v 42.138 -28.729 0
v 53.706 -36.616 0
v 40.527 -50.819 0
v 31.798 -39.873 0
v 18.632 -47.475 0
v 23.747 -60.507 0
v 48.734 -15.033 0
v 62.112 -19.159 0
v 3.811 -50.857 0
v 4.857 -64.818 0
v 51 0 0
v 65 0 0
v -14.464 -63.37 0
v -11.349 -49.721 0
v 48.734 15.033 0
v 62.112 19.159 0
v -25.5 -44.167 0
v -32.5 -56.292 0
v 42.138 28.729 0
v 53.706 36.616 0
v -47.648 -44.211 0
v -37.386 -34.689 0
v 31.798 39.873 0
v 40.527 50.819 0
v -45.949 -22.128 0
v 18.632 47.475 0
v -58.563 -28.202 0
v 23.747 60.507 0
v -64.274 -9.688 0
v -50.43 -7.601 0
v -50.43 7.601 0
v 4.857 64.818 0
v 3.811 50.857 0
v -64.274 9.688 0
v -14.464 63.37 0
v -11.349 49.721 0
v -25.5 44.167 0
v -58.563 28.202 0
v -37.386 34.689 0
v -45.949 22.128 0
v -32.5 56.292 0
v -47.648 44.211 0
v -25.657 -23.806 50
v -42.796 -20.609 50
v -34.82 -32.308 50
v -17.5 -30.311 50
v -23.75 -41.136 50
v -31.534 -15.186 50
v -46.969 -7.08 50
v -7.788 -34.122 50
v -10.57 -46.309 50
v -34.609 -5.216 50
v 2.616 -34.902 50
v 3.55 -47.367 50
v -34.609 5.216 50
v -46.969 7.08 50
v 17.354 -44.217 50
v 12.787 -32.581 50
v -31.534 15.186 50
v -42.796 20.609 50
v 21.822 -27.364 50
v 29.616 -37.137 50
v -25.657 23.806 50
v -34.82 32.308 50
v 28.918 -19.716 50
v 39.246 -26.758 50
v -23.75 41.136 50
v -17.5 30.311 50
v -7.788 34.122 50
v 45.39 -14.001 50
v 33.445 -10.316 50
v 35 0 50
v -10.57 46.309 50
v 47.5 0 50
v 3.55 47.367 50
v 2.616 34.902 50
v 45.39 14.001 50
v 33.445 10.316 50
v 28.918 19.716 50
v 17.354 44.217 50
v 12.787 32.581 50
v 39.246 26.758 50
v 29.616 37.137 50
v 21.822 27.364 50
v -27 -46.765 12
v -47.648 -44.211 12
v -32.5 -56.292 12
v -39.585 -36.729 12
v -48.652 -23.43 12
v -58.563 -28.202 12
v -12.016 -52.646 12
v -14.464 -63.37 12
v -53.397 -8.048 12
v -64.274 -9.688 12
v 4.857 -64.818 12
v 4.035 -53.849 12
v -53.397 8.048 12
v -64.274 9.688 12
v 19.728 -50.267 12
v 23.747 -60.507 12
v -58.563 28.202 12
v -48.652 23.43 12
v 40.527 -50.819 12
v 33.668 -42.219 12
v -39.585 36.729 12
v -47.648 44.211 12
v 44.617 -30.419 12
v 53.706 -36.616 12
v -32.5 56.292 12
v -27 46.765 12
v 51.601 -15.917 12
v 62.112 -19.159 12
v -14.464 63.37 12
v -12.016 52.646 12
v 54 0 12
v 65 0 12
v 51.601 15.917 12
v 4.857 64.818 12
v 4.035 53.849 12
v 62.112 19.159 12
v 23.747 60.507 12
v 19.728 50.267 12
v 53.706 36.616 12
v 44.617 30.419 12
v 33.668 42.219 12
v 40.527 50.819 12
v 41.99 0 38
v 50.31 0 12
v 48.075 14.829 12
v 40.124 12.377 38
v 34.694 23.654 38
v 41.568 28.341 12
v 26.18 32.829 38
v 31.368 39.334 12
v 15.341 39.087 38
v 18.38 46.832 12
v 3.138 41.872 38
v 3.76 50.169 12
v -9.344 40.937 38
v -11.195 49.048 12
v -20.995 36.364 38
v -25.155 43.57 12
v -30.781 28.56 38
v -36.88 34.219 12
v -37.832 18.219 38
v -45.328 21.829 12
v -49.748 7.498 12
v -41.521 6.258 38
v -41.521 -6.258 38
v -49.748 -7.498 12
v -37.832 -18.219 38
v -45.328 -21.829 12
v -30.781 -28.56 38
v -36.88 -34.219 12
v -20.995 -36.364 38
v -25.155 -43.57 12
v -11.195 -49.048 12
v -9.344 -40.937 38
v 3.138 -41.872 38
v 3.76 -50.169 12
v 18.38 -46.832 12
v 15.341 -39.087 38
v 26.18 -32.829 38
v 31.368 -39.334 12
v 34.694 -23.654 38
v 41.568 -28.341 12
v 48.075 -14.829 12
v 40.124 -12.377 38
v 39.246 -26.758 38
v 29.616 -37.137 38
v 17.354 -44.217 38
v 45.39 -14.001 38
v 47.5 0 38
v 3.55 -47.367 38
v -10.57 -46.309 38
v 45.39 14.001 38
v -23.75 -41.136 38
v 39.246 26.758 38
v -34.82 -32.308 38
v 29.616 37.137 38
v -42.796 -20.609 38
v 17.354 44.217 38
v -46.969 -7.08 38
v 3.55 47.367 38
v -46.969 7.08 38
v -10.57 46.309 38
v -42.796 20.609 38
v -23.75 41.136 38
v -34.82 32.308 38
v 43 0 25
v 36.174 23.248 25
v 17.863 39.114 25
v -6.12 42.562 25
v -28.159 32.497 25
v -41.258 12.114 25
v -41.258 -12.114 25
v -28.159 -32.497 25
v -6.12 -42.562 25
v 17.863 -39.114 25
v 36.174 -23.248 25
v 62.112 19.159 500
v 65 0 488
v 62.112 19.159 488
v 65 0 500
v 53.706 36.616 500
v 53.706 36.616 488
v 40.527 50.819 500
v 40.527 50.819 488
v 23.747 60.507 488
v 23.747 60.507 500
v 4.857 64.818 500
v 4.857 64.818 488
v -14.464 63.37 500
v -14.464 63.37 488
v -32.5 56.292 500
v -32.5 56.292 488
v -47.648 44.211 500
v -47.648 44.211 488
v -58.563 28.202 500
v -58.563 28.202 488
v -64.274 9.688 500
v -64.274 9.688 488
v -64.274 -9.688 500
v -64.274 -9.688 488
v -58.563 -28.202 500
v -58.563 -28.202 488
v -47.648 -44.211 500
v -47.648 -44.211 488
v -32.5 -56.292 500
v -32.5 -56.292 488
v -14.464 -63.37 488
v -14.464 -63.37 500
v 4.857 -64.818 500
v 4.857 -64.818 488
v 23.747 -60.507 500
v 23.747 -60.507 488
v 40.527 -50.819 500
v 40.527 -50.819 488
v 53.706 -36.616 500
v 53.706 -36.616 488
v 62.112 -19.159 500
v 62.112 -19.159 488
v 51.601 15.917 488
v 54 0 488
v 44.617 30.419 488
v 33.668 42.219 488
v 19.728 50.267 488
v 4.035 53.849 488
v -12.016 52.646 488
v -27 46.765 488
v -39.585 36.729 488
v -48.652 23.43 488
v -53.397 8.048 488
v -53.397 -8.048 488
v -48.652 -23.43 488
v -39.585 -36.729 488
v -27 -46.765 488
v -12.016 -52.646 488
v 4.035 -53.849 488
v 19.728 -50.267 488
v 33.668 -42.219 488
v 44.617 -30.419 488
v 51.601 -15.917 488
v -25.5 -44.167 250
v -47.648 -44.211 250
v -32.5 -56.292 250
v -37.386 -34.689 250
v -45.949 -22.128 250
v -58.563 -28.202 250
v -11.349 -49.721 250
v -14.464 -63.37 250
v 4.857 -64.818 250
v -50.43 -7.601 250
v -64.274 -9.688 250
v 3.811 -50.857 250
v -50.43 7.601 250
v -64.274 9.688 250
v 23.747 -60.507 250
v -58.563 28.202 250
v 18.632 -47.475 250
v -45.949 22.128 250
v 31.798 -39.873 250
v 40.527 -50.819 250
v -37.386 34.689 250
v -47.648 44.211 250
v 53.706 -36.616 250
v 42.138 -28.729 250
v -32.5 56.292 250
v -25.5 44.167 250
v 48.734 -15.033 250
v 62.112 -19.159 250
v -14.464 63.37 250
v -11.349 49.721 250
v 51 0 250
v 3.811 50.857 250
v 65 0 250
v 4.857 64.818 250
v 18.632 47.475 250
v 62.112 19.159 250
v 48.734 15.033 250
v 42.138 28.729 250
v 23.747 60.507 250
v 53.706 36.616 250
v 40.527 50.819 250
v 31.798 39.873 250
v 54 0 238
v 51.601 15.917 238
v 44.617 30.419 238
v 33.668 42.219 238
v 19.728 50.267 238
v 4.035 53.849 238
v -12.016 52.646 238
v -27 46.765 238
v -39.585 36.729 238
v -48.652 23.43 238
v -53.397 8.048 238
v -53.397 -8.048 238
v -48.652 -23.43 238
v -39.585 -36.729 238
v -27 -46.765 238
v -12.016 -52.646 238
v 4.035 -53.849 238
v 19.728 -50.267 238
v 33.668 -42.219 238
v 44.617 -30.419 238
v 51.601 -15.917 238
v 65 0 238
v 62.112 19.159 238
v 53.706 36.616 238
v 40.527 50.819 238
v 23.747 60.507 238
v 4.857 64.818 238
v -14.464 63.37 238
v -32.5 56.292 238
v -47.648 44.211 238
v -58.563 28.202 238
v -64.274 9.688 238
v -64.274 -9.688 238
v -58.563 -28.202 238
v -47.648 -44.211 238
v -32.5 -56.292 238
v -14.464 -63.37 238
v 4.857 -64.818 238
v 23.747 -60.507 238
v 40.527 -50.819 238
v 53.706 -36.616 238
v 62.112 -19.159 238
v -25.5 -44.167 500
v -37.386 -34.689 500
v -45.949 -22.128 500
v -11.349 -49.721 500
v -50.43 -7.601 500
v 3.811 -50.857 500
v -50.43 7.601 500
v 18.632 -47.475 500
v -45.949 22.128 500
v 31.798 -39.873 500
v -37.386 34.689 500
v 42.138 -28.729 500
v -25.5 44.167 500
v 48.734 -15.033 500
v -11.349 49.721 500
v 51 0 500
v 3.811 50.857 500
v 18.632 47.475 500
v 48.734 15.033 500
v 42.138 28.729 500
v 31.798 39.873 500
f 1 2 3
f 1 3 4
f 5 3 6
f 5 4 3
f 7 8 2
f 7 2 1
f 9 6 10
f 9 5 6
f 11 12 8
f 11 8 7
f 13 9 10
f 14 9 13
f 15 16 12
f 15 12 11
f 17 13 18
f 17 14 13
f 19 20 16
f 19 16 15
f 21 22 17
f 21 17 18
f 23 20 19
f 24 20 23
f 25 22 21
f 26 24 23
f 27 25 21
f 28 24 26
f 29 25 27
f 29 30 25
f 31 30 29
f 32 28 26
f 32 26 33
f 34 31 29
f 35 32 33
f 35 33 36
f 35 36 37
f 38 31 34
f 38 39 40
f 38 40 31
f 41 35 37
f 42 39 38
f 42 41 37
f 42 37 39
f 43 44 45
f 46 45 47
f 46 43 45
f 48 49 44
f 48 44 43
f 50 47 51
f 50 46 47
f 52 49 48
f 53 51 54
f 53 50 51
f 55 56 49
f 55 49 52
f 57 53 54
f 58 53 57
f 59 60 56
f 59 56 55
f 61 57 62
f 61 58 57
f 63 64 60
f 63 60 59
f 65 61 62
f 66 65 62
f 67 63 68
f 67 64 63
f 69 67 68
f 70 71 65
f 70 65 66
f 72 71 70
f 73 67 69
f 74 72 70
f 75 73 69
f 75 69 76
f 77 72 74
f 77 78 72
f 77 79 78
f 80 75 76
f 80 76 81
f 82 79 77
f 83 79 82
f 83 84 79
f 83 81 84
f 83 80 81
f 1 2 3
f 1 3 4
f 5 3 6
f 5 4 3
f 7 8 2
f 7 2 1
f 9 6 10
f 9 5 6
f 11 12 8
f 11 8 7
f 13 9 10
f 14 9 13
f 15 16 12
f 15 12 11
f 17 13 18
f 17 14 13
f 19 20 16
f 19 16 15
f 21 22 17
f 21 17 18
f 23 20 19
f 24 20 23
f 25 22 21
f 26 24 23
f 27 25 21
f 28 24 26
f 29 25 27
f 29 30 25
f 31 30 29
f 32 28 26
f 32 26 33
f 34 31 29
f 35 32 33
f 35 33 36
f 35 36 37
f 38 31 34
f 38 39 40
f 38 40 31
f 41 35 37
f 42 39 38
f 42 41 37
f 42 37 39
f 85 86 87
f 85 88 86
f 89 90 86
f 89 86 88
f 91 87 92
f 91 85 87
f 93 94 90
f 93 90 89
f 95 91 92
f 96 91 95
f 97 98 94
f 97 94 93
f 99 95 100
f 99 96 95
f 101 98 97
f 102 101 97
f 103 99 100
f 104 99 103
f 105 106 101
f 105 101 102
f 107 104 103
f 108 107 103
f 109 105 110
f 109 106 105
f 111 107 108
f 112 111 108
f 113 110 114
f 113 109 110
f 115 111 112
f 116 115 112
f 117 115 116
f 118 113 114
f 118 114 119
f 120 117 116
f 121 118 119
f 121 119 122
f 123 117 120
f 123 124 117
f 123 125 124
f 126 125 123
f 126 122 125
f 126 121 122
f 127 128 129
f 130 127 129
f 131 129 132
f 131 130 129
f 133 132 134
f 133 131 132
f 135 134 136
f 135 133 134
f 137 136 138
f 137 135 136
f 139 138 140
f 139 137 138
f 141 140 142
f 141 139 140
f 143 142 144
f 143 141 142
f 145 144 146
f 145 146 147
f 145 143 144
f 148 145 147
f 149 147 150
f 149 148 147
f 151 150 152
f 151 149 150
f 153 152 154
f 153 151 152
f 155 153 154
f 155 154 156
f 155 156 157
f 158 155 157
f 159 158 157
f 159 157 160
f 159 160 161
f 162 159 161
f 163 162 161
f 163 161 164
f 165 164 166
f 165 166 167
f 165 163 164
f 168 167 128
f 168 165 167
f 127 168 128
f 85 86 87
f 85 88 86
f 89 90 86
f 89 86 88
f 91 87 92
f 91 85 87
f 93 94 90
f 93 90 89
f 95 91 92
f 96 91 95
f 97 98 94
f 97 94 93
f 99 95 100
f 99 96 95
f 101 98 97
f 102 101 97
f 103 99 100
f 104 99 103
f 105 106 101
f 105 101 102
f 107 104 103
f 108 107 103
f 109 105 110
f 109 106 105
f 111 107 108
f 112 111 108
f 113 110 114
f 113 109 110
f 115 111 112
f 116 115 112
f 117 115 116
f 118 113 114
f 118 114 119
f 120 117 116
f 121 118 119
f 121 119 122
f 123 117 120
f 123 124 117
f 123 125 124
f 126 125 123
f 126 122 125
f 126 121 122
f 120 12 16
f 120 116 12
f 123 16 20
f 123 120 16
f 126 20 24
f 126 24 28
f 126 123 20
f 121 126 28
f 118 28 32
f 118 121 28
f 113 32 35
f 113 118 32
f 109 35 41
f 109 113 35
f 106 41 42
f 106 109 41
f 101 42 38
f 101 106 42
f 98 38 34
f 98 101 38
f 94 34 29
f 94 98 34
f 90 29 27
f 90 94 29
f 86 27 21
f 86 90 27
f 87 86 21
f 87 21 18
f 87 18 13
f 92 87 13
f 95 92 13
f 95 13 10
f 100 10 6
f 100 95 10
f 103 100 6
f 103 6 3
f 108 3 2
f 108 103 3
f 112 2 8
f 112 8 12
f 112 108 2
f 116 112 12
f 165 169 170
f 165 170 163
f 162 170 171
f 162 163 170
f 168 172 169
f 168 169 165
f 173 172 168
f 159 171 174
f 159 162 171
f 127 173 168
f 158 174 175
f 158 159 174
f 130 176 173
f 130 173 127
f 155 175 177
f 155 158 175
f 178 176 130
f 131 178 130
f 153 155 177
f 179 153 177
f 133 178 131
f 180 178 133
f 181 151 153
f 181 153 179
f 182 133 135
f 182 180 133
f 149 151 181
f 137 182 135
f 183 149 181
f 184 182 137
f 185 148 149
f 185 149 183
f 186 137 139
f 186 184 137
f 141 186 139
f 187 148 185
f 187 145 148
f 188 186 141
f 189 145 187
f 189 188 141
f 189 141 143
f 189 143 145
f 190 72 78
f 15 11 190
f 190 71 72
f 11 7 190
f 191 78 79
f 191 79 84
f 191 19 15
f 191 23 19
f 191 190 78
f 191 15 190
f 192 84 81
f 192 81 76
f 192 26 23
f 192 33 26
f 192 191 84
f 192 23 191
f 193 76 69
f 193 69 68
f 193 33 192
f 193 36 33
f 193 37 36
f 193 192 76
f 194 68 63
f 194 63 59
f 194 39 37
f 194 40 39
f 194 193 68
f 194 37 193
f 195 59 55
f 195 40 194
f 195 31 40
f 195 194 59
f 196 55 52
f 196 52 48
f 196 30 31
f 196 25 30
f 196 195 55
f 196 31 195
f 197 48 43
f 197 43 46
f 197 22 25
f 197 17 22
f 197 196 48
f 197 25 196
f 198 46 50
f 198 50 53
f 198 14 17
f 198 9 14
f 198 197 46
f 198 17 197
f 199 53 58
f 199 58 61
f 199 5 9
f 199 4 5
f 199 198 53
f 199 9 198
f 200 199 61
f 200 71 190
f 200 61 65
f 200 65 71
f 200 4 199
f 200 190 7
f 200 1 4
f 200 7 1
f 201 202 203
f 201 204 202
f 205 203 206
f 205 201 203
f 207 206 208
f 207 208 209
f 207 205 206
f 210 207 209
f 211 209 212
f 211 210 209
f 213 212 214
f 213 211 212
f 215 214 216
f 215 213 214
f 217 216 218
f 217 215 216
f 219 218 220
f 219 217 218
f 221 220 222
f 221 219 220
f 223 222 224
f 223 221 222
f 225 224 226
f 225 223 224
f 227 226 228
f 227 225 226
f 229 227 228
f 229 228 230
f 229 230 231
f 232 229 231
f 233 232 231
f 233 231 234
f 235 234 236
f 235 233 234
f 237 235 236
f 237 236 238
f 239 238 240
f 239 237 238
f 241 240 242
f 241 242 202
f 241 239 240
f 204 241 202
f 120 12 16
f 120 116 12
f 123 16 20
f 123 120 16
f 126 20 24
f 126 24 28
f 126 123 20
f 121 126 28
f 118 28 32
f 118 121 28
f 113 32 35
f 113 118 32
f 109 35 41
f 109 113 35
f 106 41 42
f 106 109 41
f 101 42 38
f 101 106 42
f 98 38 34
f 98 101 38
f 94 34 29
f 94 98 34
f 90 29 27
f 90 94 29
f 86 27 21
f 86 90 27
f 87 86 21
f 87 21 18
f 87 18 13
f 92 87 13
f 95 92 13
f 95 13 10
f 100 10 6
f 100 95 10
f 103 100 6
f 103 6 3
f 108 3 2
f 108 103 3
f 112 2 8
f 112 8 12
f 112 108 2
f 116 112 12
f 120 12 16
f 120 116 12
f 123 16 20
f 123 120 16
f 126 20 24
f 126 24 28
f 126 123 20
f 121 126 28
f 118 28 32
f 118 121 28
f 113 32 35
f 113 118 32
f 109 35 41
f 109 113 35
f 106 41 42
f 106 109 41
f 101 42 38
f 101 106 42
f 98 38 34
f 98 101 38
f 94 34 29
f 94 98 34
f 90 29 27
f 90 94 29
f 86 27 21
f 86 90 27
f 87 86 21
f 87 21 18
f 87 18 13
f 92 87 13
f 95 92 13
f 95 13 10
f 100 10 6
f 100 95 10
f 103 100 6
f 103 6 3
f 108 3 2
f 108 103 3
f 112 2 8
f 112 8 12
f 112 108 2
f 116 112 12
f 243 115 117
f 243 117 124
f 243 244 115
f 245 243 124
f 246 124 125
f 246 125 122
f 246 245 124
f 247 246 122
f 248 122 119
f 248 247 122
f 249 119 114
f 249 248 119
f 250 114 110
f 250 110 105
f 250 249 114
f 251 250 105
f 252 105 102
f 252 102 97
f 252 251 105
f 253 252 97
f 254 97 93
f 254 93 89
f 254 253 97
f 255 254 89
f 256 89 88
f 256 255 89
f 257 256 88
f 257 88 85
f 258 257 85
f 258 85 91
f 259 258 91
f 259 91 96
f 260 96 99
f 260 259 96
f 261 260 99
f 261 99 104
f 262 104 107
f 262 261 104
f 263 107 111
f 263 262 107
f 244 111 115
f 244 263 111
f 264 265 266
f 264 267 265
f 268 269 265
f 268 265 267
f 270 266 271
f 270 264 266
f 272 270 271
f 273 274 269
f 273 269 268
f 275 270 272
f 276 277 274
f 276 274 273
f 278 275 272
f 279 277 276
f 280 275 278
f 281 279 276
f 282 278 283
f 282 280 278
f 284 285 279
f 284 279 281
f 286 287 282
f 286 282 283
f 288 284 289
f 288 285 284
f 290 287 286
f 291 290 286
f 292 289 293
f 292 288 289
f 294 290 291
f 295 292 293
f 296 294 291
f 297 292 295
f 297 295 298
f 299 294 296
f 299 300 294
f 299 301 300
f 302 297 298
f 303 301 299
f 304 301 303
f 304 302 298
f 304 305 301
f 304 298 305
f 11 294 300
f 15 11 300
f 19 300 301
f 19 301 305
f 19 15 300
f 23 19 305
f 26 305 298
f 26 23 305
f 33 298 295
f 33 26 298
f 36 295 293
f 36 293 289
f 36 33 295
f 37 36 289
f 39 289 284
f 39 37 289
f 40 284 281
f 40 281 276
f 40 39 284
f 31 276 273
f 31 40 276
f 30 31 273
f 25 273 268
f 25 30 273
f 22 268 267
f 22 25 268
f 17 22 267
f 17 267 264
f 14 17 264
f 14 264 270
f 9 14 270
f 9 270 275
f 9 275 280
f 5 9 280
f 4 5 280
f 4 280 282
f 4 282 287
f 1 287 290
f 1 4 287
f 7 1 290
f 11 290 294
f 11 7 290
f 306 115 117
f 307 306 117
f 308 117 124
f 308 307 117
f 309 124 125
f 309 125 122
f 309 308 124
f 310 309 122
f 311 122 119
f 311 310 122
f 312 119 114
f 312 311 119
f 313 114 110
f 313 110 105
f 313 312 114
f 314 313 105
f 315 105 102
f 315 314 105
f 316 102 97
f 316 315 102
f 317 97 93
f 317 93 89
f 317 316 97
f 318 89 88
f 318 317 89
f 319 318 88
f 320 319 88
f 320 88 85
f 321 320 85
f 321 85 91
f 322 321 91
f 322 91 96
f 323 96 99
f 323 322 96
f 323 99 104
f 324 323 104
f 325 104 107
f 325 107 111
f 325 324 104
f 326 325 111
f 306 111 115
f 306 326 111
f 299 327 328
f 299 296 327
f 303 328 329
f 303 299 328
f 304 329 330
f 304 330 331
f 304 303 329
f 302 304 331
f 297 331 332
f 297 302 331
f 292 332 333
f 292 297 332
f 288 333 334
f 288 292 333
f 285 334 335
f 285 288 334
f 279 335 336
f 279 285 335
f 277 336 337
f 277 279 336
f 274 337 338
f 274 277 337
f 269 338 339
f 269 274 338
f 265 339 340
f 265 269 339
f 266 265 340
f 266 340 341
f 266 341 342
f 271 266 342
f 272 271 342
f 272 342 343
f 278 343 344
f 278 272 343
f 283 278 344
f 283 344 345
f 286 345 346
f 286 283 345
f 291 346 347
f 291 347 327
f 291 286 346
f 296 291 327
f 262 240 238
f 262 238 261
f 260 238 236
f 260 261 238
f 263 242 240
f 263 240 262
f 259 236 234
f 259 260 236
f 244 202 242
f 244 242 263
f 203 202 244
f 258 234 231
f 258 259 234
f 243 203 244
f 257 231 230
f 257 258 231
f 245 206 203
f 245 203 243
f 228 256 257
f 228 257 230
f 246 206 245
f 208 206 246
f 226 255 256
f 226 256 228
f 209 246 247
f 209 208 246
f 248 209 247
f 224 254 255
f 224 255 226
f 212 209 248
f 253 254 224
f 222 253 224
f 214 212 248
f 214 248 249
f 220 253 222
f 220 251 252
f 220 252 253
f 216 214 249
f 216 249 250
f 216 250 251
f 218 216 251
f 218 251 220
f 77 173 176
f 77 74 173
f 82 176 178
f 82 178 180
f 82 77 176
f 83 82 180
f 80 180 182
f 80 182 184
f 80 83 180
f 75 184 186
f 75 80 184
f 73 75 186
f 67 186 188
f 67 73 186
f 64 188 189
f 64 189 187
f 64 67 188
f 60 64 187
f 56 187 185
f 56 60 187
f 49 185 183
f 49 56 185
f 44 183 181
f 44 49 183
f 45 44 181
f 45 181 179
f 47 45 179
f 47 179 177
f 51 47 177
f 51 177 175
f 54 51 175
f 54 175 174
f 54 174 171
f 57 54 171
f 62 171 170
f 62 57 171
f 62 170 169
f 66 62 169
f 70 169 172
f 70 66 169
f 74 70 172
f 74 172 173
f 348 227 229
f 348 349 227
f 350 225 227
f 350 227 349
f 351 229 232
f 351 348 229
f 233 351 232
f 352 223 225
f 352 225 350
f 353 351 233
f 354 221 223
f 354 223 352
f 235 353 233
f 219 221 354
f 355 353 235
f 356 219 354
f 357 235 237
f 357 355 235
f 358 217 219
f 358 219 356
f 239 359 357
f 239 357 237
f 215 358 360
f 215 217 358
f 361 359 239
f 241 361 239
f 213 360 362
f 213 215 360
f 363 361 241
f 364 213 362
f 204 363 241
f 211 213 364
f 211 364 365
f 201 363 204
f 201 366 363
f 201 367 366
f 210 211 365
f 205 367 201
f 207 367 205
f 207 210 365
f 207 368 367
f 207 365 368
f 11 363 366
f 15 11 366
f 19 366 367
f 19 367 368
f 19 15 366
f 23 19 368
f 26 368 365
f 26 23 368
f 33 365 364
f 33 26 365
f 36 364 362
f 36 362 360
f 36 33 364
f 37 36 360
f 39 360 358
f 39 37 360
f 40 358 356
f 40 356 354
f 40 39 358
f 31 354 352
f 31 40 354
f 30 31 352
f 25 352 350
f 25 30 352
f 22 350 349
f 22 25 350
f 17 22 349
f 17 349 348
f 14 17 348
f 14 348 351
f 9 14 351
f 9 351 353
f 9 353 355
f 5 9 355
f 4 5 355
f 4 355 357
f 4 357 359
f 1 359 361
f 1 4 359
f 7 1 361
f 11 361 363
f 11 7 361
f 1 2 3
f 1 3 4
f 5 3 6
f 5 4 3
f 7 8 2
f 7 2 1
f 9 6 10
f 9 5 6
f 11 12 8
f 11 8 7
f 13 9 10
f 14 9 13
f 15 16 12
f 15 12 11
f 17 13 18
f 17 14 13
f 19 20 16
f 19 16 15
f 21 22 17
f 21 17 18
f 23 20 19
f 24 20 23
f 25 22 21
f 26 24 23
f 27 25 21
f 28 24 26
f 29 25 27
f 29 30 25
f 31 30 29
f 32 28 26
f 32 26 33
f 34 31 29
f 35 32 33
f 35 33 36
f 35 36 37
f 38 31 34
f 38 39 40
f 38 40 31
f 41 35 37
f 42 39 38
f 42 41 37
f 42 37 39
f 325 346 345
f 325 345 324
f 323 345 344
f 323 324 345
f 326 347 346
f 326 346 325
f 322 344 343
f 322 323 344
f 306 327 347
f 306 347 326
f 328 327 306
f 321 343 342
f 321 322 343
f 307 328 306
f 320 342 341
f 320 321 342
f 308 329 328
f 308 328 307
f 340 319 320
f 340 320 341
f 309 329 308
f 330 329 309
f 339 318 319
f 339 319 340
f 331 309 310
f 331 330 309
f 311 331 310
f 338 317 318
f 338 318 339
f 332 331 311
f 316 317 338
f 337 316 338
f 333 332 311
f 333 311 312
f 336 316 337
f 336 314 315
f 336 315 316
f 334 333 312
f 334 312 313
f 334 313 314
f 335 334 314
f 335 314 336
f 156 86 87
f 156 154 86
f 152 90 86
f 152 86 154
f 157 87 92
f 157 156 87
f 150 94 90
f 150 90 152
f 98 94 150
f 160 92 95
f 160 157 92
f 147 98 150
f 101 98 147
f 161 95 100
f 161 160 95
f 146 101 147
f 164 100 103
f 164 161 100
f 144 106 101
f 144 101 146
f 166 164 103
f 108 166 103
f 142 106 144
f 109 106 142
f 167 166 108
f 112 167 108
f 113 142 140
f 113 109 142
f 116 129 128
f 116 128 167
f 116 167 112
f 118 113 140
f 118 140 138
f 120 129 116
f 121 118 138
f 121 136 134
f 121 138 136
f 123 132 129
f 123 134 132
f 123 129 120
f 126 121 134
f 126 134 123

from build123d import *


with BuildPart() as f2:
    # F0 (on Front) → F2 (revolve)
    with BuildSketch(Plane.XZ):
        Polygon((51, 500), (51, 0), (65, 0), (65, 12), (54, 12), (54, 488), (65, 488), (65, 500), align=None)
    revolve(axis=Axis((0, 0, 71.83104), (0, 0, 1)))


with BuildPart() as f4:
    # F3 (on Front) → F4 (revolve)
    with BuildSketch(Plane.XZ):
        Polygon((35, 50), (51, 0), (65, 0), (65, 12), (50.309857, 12), (41.989857, 38), (47.5, 38), (47.5, 50), align=None)
    revolve(axis=Axis((0, 0, 71.83104), (0, 0, 1)))


with BuildPart() as f6:
    # F5 (on Front) → F6 (revolve)
    with BuildSketch(Plane.XZ):
        Polygon((51, 250), (51, 0), (65, 0), (65, 12), (54, 12), (54, 238), (65, 238), (65, 250), align=None)
    revolve(axis=Axis((0, 0, 71.83104), (0, 0, 1)))


solid = Compound([f2.part, f4.part, f6.part])
